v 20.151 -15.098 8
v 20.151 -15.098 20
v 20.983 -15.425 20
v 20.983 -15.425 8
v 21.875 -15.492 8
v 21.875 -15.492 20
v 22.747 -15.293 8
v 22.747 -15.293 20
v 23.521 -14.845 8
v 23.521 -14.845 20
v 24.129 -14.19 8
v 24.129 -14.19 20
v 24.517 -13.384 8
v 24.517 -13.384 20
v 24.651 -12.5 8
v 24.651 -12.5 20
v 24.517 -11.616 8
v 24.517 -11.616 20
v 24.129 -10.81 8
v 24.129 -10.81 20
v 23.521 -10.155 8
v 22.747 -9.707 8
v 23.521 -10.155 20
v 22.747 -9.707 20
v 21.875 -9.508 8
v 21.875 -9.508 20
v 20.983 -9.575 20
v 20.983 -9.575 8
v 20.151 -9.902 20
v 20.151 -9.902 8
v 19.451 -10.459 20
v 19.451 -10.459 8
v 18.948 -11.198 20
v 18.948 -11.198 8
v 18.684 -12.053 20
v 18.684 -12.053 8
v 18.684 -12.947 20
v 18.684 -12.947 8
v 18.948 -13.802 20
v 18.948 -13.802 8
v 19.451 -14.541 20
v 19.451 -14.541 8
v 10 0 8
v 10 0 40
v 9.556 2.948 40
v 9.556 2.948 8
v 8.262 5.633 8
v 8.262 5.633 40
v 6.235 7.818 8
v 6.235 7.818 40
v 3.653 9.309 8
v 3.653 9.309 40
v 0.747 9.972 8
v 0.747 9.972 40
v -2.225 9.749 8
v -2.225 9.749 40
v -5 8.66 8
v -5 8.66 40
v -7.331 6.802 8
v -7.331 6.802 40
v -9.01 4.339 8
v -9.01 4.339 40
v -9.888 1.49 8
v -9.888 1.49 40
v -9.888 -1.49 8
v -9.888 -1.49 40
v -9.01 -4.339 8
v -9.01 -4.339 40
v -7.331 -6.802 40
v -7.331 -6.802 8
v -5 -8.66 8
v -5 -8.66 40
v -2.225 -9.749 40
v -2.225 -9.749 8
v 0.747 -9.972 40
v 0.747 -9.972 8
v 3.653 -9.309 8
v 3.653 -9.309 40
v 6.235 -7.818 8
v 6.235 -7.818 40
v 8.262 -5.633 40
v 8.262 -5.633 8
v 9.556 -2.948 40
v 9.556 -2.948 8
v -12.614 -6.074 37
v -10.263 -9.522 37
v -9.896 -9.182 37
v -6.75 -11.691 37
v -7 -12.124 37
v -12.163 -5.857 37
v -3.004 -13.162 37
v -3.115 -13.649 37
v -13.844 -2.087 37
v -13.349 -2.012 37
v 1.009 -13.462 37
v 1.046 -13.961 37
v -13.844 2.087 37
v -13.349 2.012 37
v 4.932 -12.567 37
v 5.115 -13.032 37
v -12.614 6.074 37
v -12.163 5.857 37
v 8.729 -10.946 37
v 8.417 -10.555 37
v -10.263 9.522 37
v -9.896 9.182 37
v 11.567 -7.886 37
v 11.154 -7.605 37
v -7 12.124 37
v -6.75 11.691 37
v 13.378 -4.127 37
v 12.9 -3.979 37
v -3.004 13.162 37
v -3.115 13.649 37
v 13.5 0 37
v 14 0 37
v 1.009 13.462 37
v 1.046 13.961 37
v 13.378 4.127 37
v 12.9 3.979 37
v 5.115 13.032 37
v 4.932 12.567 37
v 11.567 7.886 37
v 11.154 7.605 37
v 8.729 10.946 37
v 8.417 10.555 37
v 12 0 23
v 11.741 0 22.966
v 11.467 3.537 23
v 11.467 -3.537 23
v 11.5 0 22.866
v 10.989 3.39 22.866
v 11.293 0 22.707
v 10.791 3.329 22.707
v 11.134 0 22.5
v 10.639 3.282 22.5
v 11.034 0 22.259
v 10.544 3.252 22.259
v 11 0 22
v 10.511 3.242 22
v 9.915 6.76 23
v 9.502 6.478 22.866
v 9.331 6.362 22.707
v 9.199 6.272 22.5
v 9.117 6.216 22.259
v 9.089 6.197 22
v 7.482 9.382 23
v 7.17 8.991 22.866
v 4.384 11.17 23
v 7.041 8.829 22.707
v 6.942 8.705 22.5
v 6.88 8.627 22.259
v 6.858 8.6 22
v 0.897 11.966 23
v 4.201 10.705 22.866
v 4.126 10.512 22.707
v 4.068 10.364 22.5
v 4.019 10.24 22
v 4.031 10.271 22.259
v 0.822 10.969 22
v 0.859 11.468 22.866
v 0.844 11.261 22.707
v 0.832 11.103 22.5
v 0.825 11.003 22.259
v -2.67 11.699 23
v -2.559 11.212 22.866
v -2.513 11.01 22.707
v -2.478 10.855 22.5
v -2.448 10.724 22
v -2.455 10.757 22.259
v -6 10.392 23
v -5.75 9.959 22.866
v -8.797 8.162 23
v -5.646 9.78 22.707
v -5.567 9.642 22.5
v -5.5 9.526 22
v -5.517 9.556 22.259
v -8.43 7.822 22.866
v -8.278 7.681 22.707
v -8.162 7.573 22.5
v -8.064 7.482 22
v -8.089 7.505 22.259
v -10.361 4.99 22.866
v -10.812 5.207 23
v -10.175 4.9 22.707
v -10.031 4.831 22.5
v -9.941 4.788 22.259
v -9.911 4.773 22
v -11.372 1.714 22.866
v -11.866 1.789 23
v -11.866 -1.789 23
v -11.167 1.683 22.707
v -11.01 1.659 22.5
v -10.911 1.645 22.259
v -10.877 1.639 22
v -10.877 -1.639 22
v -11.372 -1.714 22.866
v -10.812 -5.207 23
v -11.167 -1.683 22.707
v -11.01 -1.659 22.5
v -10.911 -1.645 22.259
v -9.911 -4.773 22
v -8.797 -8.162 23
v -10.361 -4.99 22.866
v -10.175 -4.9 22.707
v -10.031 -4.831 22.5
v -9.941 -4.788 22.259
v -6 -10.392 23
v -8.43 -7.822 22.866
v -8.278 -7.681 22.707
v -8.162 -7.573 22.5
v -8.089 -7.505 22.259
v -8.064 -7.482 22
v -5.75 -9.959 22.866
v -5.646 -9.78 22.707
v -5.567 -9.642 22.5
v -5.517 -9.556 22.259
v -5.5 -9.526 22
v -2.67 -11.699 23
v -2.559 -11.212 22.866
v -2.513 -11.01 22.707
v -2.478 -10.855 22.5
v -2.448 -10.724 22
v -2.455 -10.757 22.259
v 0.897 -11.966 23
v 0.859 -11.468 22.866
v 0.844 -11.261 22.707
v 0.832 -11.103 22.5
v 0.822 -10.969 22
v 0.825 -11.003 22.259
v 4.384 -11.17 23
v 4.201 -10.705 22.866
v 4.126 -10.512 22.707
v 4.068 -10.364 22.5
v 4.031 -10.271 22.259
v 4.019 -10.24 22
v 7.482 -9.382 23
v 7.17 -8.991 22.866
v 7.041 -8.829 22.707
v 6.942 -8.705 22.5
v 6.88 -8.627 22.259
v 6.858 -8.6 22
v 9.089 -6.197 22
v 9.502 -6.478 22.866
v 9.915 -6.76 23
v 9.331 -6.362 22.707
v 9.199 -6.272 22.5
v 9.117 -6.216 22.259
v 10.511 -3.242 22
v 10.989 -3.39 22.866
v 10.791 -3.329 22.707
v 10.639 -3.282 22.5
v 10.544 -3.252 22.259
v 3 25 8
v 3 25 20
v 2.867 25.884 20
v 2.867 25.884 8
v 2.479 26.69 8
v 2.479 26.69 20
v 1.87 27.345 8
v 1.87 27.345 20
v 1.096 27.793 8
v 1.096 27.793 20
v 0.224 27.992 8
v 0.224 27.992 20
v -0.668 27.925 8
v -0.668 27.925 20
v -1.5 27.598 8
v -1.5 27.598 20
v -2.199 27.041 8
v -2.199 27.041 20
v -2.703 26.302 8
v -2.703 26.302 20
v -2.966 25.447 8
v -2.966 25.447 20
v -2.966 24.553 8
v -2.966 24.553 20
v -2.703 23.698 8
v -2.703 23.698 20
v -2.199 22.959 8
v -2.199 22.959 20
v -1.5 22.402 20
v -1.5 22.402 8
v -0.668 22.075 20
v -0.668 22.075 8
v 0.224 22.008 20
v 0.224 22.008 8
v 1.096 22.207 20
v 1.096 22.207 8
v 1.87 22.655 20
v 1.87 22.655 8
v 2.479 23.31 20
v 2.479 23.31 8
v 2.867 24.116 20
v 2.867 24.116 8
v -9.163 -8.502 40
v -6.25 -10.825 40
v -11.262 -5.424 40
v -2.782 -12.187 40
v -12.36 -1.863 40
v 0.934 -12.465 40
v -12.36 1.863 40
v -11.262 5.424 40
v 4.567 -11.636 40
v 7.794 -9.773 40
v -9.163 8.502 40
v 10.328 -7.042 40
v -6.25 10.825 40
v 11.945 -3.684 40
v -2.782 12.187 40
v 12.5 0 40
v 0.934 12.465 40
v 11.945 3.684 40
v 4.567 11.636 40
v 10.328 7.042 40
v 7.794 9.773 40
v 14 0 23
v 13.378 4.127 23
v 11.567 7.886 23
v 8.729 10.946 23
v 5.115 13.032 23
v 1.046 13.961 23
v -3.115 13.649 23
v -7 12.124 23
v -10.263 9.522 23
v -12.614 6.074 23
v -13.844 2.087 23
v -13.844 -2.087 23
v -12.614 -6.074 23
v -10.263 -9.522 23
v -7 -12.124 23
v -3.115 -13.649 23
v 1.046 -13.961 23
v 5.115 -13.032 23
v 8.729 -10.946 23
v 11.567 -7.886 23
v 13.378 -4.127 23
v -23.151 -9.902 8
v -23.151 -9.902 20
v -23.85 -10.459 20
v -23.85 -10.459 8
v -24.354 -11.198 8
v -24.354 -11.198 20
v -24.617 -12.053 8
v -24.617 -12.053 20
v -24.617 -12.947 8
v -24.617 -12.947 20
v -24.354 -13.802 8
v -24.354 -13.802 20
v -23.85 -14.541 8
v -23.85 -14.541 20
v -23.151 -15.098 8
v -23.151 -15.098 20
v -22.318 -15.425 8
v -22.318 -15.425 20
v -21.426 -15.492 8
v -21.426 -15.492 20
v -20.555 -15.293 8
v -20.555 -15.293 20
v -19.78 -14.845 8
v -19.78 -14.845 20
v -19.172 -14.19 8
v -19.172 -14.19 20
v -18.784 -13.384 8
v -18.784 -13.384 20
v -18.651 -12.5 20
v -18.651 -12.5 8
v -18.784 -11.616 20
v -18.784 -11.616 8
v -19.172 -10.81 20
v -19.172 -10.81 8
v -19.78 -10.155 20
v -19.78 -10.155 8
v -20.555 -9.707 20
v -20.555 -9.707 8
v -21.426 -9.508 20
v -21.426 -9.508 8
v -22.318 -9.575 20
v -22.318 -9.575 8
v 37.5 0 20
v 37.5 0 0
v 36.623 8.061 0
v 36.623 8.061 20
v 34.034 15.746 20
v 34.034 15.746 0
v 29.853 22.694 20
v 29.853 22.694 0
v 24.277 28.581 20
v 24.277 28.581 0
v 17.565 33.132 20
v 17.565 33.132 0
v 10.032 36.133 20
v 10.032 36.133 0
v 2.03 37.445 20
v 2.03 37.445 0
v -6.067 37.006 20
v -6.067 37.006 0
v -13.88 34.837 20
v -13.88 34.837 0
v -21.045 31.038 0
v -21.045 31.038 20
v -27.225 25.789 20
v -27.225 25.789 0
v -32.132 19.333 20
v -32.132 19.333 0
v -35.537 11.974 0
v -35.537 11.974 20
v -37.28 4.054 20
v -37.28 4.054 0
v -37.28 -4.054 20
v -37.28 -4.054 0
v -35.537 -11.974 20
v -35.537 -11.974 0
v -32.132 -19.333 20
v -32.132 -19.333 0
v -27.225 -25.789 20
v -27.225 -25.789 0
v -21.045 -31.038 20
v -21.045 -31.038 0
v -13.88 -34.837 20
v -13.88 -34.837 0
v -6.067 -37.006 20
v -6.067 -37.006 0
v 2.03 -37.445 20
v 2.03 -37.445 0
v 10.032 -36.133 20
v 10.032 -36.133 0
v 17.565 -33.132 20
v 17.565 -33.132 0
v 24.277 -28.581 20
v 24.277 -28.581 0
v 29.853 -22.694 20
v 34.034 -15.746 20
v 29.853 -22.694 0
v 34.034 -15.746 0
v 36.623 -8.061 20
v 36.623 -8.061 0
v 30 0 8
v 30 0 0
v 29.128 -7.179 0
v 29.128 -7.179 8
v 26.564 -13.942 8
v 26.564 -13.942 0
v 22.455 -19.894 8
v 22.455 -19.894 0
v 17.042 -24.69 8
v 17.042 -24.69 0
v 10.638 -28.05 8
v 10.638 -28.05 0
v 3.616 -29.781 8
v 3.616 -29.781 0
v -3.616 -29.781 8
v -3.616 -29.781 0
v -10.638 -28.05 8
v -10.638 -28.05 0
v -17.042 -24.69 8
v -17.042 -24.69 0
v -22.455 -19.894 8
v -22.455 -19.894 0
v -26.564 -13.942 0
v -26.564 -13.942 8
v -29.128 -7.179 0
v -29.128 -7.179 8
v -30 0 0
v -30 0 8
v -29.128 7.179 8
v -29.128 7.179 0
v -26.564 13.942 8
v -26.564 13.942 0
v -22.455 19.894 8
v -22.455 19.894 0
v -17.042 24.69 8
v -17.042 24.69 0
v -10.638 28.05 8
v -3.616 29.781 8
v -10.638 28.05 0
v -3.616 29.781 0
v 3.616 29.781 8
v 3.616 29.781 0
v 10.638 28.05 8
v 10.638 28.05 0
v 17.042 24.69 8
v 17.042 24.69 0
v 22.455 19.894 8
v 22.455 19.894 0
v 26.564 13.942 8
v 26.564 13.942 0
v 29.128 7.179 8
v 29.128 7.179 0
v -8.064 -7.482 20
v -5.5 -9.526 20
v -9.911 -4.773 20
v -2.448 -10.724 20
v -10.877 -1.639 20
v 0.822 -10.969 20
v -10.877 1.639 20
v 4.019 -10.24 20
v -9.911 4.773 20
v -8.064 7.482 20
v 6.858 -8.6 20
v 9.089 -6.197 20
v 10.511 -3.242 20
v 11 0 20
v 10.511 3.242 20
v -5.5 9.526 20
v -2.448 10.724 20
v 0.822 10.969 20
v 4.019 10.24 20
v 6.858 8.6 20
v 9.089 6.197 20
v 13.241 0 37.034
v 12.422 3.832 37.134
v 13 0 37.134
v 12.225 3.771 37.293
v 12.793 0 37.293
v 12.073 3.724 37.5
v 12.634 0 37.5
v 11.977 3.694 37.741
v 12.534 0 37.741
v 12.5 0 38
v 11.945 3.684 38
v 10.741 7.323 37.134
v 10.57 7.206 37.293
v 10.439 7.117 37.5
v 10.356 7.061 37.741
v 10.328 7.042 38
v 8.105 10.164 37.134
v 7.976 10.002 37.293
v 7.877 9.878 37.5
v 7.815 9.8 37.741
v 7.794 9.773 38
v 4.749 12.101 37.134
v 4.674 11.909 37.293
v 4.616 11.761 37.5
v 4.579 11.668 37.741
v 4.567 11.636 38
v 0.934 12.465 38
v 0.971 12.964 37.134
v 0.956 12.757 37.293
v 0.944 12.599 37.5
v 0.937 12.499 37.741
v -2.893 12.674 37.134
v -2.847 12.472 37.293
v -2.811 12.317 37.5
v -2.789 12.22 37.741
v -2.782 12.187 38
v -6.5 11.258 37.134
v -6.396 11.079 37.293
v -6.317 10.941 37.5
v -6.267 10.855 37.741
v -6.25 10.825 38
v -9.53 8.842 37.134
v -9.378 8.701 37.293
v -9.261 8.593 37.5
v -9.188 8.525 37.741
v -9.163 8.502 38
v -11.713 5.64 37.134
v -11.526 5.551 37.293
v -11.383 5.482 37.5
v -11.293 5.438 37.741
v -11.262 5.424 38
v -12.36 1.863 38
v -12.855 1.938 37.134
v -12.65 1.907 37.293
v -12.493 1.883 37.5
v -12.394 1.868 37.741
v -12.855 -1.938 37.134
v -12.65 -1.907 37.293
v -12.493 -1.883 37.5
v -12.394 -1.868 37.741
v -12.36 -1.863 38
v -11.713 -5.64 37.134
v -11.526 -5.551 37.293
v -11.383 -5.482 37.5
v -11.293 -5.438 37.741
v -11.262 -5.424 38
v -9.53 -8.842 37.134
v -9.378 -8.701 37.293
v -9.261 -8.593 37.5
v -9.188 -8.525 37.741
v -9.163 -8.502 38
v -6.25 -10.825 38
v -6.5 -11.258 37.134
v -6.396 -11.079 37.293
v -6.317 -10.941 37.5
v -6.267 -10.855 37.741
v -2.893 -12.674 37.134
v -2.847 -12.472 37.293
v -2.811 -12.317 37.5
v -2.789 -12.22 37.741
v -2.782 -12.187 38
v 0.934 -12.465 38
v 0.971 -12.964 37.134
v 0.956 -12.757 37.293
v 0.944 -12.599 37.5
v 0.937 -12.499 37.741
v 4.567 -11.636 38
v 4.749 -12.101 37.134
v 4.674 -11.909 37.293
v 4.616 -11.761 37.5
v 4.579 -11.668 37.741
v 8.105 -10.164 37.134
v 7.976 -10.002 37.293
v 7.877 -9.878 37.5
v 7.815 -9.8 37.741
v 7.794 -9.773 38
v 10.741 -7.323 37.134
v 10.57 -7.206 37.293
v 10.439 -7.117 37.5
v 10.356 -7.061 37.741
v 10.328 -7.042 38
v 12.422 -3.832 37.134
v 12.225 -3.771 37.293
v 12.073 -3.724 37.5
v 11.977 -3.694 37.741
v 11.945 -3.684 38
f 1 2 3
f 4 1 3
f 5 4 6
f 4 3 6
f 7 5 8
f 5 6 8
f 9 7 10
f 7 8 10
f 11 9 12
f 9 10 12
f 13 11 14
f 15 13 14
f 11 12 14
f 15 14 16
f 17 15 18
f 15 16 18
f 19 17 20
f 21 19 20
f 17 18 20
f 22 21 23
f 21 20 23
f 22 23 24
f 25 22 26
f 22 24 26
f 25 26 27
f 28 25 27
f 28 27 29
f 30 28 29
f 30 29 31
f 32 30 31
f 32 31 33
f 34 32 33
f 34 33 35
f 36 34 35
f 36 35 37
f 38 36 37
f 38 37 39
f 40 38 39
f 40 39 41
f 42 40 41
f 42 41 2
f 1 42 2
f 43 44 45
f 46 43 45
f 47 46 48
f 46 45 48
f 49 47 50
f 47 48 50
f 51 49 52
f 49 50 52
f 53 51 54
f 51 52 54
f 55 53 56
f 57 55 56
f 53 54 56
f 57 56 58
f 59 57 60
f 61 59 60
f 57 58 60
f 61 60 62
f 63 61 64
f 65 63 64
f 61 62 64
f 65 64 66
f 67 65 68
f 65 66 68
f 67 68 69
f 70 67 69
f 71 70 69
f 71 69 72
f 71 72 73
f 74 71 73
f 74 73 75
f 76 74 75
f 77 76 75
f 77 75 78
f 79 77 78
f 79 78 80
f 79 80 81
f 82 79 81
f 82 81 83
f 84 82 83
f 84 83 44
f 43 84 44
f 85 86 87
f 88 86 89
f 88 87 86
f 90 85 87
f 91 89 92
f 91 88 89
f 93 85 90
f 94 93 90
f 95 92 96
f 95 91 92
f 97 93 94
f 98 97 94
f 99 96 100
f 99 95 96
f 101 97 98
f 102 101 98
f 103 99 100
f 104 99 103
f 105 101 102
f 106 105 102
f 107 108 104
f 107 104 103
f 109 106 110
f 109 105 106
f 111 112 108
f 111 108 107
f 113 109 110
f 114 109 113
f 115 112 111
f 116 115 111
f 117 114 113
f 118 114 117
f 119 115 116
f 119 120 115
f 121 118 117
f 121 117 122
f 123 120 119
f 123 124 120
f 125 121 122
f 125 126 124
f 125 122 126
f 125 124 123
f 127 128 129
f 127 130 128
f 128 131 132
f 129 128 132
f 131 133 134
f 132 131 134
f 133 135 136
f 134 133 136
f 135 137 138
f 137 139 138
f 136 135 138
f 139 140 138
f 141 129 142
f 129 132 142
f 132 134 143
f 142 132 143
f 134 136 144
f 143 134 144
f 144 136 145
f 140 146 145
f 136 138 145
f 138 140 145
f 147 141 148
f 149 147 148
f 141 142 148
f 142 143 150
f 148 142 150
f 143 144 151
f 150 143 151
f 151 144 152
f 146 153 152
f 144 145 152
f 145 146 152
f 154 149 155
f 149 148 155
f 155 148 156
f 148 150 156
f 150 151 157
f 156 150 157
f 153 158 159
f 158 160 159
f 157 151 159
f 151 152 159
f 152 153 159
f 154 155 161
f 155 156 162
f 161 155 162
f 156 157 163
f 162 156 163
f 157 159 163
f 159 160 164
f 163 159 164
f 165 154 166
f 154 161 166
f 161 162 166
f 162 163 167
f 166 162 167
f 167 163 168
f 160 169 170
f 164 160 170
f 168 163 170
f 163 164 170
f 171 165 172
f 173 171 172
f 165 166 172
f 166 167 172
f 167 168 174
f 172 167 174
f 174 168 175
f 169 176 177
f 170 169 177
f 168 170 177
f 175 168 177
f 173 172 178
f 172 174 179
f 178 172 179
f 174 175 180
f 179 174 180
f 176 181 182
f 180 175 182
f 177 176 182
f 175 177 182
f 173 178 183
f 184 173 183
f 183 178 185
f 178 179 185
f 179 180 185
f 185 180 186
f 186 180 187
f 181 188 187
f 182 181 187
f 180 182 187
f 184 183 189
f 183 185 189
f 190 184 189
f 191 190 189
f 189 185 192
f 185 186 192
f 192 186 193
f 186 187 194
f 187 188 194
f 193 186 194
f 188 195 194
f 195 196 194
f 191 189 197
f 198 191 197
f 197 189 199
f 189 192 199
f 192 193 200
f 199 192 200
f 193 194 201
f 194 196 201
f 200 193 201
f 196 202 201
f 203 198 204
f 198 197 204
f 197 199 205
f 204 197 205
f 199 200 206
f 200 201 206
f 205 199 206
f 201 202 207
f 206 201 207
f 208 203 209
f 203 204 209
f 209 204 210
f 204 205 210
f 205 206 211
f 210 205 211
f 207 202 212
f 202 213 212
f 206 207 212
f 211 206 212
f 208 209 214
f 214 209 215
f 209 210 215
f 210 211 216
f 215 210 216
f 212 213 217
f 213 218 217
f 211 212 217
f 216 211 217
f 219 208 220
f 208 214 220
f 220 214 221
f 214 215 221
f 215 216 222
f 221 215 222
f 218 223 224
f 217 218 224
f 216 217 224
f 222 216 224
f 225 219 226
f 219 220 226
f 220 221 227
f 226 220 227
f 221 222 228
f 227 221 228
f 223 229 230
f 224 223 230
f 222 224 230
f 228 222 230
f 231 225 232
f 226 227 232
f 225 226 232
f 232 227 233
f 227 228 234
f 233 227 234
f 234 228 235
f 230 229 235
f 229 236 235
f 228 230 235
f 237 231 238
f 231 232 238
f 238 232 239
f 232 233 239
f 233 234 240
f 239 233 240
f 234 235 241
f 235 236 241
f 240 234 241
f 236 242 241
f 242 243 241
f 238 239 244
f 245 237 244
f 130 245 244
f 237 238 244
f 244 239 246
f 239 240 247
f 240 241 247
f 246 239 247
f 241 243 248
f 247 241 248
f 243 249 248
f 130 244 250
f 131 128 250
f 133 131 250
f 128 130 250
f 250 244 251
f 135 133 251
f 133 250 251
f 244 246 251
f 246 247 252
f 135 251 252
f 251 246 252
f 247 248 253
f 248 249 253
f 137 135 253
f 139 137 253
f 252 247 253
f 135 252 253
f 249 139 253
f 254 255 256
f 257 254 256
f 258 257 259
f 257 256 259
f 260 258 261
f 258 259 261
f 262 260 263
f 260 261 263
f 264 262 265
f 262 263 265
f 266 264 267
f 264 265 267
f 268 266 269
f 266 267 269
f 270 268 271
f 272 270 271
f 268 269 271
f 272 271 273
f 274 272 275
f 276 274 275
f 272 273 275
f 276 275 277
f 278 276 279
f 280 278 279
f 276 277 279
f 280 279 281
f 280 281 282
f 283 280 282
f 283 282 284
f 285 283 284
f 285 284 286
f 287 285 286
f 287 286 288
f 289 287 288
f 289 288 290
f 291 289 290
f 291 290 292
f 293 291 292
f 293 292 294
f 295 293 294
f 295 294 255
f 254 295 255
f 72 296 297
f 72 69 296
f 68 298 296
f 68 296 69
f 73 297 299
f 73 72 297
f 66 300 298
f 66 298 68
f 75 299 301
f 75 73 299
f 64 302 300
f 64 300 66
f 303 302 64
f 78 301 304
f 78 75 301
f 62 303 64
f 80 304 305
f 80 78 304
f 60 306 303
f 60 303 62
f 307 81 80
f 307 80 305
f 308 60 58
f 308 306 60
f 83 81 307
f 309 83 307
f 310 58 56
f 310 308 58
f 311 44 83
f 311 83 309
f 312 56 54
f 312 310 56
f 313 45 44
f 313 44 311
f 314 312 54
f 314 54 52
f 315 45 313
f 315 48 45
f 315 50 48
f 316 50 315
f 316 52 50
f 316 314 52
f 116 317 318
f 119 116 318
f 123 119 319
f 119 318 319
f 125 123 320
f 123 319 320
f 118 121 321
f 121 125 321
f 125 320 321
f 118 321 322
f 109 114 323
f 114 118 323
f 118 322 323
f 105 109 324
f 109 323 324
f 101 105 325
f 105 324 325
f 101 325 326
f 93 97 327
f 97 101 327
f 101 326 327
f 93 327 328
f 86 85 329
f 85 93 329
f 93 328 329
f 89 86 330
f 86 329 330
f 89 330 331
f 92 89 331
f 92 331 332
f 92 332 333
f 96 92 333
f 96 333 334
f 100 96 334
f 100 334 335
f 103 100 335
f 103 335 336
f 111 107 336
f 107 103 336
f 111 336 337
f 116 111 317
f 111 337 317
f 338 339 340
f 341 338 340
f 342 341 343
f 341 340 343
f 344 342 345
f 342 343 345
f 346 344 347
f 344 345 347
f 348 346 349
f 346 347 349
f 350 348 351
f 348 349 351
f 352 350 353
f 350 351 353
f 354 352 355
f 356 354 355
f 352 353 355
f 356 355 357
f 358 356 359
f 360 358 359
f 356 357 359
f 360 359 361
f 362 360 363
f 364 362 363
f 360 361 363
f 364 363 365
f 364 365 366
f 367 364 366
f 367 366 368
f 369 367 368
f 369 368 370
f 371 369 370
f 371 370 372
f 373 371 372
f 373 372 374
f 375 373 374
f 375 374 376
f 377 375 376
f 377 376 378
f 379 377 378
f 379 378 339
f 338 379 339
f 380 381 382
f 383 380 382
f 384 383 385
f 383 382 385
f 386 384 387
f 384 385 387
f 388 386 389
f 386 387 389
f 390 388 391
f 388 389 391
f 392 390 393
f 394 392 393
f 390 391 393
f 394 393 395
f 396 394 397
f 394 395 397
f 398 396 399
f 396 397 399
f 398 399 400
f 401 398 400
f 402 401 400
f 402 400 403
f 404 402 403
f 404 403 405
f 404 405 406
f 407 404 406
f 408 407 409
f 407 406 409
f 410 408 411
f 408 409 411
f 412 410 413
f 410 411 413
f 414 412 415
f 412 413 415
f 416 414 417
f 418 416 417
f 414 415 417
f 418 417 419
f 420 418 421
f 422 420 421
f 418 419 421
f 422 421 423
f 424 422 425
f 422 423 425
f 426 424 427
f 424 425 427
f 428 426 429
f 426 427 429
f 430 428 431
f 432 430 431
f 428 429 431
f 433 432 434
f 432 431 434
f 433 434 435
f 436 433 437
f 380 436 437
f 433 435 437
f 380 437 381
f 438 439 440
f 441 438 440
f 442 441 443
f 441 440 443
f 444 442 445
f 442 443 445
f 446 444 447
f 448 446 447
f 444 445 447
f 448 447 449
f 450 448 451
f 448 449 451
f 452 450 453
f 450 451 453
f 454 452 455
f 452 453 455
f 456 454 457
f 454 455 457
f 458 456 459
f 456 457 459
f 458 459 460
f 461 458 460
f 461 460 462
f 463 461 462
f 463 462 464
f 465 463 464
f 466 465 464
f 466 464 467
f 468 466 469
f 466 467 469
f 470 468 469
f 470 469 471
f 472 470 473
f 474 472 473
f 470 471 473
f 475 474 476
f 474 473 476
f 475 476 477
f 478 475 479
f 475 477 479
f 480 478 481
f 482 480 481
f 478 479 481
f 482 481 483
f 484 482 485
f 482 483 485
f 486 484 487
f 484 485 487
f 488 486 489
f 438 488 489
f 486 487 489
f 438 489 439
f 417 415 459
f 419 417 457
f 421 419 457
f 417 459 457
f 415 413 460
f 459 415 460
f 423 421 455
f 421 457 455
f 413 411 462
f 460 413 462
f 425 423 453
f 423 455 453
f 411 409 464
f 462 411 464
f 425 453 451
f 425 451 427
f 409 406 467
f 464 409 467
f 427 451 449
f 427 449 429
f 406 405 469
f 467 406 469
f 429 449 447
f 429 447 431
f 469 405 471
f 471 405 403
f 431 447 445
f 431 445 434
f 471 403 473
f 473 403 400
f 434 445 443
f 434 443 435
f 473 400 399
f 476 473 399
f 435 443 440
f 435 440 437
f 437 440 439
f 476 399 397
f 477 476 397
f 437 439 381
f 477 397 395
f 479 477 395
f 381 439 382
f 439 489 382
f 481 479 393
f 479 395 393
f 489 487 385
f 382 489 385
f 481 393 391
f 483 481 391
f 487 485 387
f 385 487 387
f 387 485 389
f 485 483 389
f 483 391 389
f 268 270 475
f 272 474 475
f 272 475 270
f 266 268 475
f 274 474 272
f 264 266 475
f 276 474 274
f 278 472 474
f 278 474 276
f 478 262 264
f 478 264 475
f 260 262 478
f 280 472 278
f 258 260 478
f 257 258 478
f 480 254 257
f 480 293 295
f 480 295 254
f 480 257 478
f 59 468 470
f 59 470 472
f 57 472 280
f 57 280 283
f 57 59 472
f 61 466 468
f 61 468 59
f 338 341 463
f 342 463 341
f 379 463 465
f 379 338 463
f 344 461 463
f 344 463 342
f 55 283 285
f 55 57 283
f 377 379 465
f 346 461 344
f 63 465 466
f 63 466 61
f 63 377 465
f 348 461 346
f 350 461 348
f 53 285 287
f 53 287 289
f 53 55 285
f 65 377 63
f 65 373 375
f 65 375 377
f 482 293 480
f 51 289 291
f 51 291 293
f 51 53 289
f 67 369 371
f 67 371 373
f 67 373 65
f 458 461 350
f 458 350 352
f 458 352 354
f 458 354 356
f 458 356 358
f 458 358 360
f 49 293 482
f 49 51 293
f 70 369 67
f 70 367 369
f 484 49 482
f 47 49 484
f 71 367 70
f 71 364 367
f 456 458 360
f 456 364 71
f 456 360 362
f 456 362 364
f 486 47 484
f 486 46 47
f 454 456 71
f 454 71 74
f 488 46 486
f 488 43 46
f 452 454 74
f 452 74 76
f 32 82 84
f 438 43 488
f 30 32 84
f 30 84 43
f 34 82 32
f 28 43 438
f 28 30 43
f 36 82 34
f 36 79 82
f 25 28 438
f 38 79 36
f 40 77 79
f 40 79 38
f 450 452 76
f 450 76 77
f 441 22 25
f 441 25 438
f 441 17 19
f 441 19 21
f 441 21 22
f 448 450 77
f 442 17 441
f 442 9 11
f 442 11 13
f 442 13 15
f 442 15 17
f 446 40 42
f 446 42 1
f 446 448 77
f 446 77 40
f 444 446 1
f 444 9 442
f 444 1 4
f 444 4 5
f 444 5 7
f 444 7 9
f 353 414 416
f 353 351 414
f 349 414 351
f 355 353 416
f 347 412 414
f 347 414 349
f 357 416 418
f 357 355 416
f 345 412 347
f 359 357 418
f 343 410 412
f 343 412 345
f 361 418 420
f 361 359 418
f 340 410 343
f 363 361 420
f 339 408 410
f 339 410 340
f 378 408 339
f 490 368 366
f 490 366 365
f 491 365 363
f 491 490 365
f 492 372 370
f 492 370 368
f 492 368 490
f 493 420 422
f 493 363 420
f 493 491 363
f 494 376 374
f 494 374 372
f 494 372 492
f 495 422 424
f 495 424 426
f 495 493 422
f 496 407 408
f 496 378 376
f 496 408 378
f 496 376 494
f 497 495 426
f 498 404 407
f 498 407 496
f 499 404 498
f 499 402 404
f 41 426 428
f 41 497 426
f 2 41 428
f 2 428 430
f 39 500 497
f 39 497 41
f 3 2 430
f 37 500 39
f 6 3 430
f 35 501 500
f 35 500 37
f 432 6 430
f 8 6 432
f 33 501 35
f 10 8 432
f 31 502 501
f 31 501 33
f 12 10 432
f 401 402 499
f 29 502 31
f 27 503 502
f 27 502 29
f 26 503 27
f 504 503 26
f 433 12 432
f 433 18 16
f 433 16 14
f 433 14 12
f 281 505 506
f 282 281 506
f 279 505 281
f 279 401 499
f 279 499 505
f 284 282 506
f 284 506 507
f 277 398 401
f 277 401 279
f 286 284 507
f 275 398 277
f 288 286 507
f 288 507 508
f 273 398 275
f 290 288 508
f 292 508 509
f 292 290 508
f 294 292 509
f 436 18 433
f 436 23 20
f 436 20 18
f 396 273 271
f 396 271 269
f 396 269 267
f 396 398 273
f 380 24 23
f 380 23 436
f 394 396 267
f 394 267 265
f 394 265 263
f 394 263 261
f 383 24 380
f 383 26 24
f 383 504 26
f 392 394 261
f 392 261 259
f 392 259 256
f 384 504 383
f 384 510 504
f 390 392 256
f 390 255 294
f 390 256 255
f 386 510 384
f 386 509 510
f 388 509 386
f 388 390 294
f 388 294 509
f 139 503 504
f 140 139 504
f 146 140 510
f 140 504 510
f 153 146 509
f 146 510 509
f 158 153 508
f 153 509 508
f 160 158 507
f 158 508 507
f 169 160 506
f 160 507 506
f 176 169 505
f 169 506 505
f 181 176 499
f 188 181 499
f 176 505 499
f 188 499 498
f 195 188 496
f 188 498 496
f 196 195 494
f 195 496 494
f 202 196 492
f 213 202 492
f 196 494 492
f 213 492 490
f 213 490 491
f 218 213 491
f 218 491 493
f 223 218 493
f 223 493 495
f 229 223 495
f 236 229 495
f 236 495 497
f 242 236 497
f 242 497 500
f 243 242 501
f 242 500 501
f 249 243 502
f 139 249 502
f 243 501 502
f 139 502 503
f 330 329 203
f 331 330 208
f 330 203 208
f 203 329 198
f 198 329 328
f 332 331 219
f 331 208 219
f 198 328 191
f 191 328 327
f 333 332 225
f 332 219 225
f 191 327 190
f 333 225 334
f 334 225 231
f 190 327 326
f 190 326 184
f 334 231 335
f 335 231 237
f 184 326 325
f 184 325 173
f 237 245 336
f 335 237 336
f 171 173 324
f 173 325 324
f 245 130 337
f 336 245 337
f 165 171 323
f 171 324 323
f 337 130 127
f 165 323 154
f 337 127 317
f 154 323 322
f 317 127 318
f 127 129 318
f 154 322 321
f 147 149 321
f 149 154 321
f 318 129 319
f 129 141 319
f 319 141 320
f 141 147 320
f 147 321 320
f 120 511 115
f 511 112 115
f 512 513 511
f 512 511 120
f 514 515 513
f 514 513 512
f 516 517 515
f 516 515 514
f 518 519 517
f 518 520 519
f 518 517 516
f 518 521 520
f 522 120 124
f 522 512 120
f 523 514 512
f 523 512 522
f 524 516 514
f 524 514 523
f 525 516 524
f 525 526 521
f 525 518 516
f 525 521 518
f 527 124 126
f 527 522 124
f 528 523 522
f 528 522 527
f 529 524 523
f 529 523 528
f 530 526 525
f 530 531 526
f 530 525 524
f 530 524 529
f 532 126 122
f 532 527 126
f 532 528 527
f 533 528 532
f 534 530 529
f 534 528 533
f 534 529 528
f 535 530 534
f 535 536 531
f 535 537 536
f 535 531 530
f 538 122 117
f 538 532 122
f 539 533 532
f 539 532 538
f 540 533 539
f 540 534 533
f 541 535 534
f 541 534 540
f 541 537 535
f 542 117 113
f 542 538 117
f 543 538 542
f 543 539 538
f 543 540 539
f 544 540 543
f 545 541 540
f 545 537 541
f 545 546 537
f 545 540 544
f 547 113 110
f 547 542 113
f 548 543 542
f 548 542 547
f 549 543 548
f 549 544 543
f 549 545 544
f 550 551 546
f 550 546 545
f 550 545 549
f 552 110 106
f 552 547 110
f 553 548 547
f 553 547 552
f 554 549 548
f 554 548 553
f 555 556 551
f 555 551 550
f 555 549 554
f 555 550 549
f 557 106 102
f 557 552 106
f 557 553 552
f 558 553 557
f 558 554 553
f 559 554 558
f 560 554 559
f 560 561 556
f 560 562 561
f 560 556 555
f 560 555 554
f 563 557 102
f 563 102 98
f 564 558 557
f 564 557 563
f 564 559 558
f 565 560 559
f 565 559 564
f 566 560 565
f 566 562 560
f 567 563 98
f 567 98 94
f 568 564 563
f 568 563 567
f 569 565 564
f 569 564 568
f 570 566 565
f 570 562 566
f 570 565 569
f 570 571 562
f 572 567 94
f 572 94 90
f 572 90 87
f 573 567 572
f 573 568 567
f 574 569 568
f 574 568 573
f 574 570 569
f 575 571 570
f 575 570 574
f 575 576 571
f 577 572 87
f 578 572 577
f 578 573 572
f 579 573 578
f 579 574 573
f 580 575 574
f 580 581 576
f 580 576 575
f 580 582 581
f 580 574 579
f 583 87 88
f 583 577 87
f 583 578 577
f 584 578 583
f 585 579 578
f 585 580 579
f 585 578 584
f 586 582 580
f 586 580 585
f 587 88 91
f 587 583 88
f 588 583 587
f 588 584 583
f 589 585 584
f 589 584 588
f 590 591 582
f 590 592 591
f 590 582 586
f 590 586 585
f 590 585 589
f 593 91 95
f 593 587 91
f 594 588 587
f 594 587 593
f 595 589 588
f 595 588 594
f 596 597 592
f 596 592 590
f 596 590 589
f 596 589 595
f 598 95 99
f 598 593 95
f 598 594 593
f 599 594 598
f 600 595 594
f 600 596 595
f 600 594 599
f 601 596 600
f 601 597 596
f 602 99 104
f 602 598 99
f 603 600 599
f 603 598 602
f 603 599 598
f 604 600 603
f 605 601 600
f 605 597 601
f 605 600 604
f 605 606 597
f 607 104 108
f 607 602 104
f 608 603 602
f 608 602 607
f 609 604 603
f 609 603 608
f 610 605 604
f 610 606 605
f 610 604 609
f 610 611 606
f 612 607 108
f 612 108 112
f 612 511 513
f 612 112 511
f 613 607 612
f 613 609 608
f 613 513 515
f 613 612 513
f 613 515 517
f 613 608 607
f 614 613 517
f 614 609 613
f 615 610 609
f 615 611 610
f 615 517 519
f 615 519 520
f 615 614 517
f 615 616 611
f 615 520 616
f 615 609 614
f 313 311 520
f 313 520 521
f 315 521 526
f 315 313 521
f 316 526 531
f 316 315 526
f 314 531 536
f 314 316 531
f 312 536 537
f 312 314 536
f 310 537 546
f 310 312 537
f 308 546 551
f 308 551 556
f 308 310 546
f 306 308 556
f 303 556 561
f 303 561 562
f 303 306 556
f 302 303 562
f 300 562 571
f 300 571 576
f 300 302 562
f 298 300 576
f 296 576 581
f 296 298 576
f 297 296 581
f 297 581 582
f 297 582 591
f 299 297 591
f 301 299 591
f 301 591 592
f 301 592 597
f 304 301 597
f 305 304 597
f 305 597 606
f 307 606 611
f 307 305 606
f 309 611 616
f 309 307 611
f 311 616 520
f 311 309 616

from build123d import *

# Parameters (mm, degrees)
SKETCH004_R        = 24.41662
SKETCH004_R_2      = 11
PAD002_DEPTH       = 3
SKETCH_R           = 37.5
PAD_DEPTH          = 20
SKETCH001_R        = 30
POCKET_DEPTH       = 8
SKETCH002_R        = 3
POCKET001_DEPTH    = 235.871331
POLARPATTERN_COUNT = 3
SKETCH003_R        = 14
PAD001_DEPTH       = 20
SKETCH005_R        = 10
POCKET002_DEPTH    = 40.001
SKETCH006_R        = 20.656229
SKETCH006_R_2      = 12.5
POCKET003_DEPTH    = 3
FILLET_R           = 1
FILLET001_R        = 1


with BuildPart() as pad002:
    # Sketch004 → Pad002 (new body)
    with BuildSketch(Plane.XY.offset(20)):
        Circle(SKETCH004_R)
        Circle(SKETCH004_R_2, mode=Mode.SUBTRACT)
    extrude(amount=PAD002_DEPTH)


with BuildPart() as fillet001:
    # Sketch → Pad (new body)
    with BuildSketch(Plane.XY):
        Circle(SKETCH_R)
    extrude(amount=PAD_DEPTH)

    # Sketch001 → Pocket (cut)
    with BuildSketch(Plane(origin=(0, 0, 0), x_dir=(1, 0, 0), z_dir=(0, 0, -1))):
        Circle(SKETCH001_R)
    extrude(amount=-POCKET_DEPTH, mode=Mode.SUBTRACT)

    # Sketch002 → Pocket001 (cut, through all)
    with BuildSketch(Plane.XY.offset(20)):
        with Locations((0, 25)):
            Circle(SKETCH002_R)
    pocket001 = extrude(amount=-POCKET001_DEPTH, mode=Mode.SUBTRACT)

    # PolarPattern: Pocket001 ×3 about axis
    polarpattern_axis = Axis((0, 0, 20), (0, 0, 1))
    for i in range(1, POLARPATTERN_COUNT):
        add(pocket001.rotate(polarpattern_axis, i * 360 / POLARPATTERN_COUNT), mode=Mode.SUBTRACT)

    # Sketch003 → Pad001 (new body)
    with BuildSketch(Plane.XY.offset(20)):
        Circle(SKETCH003_R)
    extrude(amount=PAD001_DEPTH)

    # Cut: cut Pad002
    add(pad002.part, mode=Mode.SUBTRACT)

    # Sketch005 → Pocket002 (cut, through all)
    with BuildSketch(Plane.XY.offset(40)):
        Circle(SKETCH005_R)
    extrude(amount=-POCKET002_DEPTH, mode=Mode.SUBTRACT)

    # Sketch006 → Pocket003 (cut)
    with BuildSketch(Plane.XY.offset(40)):
        Circle(SKETCH006_R)
        Circle(SKETCH006_R_2, mode=Mode.SUBTRACT)
    extrude(amount=-POCKET003_DEPTH, mode=Mode.SUBTRACT)

    # Fillet
    fillet_edges = [fillet001.edges().sort_by_distance(p)[0] for p in [
        (-12.5, 0, 37),
    ]]
    fillet(fillet_edges, radius=FILLET_R)

    # Fillet001
    fillet001_edges = [fillet001.edges().sort_by_distance(p)[0] for p in [
        (-11, 0, 23),
    ]]
    fillet(fillet001_edges, radius=FILLET001_R)


solid = fillet001.part
